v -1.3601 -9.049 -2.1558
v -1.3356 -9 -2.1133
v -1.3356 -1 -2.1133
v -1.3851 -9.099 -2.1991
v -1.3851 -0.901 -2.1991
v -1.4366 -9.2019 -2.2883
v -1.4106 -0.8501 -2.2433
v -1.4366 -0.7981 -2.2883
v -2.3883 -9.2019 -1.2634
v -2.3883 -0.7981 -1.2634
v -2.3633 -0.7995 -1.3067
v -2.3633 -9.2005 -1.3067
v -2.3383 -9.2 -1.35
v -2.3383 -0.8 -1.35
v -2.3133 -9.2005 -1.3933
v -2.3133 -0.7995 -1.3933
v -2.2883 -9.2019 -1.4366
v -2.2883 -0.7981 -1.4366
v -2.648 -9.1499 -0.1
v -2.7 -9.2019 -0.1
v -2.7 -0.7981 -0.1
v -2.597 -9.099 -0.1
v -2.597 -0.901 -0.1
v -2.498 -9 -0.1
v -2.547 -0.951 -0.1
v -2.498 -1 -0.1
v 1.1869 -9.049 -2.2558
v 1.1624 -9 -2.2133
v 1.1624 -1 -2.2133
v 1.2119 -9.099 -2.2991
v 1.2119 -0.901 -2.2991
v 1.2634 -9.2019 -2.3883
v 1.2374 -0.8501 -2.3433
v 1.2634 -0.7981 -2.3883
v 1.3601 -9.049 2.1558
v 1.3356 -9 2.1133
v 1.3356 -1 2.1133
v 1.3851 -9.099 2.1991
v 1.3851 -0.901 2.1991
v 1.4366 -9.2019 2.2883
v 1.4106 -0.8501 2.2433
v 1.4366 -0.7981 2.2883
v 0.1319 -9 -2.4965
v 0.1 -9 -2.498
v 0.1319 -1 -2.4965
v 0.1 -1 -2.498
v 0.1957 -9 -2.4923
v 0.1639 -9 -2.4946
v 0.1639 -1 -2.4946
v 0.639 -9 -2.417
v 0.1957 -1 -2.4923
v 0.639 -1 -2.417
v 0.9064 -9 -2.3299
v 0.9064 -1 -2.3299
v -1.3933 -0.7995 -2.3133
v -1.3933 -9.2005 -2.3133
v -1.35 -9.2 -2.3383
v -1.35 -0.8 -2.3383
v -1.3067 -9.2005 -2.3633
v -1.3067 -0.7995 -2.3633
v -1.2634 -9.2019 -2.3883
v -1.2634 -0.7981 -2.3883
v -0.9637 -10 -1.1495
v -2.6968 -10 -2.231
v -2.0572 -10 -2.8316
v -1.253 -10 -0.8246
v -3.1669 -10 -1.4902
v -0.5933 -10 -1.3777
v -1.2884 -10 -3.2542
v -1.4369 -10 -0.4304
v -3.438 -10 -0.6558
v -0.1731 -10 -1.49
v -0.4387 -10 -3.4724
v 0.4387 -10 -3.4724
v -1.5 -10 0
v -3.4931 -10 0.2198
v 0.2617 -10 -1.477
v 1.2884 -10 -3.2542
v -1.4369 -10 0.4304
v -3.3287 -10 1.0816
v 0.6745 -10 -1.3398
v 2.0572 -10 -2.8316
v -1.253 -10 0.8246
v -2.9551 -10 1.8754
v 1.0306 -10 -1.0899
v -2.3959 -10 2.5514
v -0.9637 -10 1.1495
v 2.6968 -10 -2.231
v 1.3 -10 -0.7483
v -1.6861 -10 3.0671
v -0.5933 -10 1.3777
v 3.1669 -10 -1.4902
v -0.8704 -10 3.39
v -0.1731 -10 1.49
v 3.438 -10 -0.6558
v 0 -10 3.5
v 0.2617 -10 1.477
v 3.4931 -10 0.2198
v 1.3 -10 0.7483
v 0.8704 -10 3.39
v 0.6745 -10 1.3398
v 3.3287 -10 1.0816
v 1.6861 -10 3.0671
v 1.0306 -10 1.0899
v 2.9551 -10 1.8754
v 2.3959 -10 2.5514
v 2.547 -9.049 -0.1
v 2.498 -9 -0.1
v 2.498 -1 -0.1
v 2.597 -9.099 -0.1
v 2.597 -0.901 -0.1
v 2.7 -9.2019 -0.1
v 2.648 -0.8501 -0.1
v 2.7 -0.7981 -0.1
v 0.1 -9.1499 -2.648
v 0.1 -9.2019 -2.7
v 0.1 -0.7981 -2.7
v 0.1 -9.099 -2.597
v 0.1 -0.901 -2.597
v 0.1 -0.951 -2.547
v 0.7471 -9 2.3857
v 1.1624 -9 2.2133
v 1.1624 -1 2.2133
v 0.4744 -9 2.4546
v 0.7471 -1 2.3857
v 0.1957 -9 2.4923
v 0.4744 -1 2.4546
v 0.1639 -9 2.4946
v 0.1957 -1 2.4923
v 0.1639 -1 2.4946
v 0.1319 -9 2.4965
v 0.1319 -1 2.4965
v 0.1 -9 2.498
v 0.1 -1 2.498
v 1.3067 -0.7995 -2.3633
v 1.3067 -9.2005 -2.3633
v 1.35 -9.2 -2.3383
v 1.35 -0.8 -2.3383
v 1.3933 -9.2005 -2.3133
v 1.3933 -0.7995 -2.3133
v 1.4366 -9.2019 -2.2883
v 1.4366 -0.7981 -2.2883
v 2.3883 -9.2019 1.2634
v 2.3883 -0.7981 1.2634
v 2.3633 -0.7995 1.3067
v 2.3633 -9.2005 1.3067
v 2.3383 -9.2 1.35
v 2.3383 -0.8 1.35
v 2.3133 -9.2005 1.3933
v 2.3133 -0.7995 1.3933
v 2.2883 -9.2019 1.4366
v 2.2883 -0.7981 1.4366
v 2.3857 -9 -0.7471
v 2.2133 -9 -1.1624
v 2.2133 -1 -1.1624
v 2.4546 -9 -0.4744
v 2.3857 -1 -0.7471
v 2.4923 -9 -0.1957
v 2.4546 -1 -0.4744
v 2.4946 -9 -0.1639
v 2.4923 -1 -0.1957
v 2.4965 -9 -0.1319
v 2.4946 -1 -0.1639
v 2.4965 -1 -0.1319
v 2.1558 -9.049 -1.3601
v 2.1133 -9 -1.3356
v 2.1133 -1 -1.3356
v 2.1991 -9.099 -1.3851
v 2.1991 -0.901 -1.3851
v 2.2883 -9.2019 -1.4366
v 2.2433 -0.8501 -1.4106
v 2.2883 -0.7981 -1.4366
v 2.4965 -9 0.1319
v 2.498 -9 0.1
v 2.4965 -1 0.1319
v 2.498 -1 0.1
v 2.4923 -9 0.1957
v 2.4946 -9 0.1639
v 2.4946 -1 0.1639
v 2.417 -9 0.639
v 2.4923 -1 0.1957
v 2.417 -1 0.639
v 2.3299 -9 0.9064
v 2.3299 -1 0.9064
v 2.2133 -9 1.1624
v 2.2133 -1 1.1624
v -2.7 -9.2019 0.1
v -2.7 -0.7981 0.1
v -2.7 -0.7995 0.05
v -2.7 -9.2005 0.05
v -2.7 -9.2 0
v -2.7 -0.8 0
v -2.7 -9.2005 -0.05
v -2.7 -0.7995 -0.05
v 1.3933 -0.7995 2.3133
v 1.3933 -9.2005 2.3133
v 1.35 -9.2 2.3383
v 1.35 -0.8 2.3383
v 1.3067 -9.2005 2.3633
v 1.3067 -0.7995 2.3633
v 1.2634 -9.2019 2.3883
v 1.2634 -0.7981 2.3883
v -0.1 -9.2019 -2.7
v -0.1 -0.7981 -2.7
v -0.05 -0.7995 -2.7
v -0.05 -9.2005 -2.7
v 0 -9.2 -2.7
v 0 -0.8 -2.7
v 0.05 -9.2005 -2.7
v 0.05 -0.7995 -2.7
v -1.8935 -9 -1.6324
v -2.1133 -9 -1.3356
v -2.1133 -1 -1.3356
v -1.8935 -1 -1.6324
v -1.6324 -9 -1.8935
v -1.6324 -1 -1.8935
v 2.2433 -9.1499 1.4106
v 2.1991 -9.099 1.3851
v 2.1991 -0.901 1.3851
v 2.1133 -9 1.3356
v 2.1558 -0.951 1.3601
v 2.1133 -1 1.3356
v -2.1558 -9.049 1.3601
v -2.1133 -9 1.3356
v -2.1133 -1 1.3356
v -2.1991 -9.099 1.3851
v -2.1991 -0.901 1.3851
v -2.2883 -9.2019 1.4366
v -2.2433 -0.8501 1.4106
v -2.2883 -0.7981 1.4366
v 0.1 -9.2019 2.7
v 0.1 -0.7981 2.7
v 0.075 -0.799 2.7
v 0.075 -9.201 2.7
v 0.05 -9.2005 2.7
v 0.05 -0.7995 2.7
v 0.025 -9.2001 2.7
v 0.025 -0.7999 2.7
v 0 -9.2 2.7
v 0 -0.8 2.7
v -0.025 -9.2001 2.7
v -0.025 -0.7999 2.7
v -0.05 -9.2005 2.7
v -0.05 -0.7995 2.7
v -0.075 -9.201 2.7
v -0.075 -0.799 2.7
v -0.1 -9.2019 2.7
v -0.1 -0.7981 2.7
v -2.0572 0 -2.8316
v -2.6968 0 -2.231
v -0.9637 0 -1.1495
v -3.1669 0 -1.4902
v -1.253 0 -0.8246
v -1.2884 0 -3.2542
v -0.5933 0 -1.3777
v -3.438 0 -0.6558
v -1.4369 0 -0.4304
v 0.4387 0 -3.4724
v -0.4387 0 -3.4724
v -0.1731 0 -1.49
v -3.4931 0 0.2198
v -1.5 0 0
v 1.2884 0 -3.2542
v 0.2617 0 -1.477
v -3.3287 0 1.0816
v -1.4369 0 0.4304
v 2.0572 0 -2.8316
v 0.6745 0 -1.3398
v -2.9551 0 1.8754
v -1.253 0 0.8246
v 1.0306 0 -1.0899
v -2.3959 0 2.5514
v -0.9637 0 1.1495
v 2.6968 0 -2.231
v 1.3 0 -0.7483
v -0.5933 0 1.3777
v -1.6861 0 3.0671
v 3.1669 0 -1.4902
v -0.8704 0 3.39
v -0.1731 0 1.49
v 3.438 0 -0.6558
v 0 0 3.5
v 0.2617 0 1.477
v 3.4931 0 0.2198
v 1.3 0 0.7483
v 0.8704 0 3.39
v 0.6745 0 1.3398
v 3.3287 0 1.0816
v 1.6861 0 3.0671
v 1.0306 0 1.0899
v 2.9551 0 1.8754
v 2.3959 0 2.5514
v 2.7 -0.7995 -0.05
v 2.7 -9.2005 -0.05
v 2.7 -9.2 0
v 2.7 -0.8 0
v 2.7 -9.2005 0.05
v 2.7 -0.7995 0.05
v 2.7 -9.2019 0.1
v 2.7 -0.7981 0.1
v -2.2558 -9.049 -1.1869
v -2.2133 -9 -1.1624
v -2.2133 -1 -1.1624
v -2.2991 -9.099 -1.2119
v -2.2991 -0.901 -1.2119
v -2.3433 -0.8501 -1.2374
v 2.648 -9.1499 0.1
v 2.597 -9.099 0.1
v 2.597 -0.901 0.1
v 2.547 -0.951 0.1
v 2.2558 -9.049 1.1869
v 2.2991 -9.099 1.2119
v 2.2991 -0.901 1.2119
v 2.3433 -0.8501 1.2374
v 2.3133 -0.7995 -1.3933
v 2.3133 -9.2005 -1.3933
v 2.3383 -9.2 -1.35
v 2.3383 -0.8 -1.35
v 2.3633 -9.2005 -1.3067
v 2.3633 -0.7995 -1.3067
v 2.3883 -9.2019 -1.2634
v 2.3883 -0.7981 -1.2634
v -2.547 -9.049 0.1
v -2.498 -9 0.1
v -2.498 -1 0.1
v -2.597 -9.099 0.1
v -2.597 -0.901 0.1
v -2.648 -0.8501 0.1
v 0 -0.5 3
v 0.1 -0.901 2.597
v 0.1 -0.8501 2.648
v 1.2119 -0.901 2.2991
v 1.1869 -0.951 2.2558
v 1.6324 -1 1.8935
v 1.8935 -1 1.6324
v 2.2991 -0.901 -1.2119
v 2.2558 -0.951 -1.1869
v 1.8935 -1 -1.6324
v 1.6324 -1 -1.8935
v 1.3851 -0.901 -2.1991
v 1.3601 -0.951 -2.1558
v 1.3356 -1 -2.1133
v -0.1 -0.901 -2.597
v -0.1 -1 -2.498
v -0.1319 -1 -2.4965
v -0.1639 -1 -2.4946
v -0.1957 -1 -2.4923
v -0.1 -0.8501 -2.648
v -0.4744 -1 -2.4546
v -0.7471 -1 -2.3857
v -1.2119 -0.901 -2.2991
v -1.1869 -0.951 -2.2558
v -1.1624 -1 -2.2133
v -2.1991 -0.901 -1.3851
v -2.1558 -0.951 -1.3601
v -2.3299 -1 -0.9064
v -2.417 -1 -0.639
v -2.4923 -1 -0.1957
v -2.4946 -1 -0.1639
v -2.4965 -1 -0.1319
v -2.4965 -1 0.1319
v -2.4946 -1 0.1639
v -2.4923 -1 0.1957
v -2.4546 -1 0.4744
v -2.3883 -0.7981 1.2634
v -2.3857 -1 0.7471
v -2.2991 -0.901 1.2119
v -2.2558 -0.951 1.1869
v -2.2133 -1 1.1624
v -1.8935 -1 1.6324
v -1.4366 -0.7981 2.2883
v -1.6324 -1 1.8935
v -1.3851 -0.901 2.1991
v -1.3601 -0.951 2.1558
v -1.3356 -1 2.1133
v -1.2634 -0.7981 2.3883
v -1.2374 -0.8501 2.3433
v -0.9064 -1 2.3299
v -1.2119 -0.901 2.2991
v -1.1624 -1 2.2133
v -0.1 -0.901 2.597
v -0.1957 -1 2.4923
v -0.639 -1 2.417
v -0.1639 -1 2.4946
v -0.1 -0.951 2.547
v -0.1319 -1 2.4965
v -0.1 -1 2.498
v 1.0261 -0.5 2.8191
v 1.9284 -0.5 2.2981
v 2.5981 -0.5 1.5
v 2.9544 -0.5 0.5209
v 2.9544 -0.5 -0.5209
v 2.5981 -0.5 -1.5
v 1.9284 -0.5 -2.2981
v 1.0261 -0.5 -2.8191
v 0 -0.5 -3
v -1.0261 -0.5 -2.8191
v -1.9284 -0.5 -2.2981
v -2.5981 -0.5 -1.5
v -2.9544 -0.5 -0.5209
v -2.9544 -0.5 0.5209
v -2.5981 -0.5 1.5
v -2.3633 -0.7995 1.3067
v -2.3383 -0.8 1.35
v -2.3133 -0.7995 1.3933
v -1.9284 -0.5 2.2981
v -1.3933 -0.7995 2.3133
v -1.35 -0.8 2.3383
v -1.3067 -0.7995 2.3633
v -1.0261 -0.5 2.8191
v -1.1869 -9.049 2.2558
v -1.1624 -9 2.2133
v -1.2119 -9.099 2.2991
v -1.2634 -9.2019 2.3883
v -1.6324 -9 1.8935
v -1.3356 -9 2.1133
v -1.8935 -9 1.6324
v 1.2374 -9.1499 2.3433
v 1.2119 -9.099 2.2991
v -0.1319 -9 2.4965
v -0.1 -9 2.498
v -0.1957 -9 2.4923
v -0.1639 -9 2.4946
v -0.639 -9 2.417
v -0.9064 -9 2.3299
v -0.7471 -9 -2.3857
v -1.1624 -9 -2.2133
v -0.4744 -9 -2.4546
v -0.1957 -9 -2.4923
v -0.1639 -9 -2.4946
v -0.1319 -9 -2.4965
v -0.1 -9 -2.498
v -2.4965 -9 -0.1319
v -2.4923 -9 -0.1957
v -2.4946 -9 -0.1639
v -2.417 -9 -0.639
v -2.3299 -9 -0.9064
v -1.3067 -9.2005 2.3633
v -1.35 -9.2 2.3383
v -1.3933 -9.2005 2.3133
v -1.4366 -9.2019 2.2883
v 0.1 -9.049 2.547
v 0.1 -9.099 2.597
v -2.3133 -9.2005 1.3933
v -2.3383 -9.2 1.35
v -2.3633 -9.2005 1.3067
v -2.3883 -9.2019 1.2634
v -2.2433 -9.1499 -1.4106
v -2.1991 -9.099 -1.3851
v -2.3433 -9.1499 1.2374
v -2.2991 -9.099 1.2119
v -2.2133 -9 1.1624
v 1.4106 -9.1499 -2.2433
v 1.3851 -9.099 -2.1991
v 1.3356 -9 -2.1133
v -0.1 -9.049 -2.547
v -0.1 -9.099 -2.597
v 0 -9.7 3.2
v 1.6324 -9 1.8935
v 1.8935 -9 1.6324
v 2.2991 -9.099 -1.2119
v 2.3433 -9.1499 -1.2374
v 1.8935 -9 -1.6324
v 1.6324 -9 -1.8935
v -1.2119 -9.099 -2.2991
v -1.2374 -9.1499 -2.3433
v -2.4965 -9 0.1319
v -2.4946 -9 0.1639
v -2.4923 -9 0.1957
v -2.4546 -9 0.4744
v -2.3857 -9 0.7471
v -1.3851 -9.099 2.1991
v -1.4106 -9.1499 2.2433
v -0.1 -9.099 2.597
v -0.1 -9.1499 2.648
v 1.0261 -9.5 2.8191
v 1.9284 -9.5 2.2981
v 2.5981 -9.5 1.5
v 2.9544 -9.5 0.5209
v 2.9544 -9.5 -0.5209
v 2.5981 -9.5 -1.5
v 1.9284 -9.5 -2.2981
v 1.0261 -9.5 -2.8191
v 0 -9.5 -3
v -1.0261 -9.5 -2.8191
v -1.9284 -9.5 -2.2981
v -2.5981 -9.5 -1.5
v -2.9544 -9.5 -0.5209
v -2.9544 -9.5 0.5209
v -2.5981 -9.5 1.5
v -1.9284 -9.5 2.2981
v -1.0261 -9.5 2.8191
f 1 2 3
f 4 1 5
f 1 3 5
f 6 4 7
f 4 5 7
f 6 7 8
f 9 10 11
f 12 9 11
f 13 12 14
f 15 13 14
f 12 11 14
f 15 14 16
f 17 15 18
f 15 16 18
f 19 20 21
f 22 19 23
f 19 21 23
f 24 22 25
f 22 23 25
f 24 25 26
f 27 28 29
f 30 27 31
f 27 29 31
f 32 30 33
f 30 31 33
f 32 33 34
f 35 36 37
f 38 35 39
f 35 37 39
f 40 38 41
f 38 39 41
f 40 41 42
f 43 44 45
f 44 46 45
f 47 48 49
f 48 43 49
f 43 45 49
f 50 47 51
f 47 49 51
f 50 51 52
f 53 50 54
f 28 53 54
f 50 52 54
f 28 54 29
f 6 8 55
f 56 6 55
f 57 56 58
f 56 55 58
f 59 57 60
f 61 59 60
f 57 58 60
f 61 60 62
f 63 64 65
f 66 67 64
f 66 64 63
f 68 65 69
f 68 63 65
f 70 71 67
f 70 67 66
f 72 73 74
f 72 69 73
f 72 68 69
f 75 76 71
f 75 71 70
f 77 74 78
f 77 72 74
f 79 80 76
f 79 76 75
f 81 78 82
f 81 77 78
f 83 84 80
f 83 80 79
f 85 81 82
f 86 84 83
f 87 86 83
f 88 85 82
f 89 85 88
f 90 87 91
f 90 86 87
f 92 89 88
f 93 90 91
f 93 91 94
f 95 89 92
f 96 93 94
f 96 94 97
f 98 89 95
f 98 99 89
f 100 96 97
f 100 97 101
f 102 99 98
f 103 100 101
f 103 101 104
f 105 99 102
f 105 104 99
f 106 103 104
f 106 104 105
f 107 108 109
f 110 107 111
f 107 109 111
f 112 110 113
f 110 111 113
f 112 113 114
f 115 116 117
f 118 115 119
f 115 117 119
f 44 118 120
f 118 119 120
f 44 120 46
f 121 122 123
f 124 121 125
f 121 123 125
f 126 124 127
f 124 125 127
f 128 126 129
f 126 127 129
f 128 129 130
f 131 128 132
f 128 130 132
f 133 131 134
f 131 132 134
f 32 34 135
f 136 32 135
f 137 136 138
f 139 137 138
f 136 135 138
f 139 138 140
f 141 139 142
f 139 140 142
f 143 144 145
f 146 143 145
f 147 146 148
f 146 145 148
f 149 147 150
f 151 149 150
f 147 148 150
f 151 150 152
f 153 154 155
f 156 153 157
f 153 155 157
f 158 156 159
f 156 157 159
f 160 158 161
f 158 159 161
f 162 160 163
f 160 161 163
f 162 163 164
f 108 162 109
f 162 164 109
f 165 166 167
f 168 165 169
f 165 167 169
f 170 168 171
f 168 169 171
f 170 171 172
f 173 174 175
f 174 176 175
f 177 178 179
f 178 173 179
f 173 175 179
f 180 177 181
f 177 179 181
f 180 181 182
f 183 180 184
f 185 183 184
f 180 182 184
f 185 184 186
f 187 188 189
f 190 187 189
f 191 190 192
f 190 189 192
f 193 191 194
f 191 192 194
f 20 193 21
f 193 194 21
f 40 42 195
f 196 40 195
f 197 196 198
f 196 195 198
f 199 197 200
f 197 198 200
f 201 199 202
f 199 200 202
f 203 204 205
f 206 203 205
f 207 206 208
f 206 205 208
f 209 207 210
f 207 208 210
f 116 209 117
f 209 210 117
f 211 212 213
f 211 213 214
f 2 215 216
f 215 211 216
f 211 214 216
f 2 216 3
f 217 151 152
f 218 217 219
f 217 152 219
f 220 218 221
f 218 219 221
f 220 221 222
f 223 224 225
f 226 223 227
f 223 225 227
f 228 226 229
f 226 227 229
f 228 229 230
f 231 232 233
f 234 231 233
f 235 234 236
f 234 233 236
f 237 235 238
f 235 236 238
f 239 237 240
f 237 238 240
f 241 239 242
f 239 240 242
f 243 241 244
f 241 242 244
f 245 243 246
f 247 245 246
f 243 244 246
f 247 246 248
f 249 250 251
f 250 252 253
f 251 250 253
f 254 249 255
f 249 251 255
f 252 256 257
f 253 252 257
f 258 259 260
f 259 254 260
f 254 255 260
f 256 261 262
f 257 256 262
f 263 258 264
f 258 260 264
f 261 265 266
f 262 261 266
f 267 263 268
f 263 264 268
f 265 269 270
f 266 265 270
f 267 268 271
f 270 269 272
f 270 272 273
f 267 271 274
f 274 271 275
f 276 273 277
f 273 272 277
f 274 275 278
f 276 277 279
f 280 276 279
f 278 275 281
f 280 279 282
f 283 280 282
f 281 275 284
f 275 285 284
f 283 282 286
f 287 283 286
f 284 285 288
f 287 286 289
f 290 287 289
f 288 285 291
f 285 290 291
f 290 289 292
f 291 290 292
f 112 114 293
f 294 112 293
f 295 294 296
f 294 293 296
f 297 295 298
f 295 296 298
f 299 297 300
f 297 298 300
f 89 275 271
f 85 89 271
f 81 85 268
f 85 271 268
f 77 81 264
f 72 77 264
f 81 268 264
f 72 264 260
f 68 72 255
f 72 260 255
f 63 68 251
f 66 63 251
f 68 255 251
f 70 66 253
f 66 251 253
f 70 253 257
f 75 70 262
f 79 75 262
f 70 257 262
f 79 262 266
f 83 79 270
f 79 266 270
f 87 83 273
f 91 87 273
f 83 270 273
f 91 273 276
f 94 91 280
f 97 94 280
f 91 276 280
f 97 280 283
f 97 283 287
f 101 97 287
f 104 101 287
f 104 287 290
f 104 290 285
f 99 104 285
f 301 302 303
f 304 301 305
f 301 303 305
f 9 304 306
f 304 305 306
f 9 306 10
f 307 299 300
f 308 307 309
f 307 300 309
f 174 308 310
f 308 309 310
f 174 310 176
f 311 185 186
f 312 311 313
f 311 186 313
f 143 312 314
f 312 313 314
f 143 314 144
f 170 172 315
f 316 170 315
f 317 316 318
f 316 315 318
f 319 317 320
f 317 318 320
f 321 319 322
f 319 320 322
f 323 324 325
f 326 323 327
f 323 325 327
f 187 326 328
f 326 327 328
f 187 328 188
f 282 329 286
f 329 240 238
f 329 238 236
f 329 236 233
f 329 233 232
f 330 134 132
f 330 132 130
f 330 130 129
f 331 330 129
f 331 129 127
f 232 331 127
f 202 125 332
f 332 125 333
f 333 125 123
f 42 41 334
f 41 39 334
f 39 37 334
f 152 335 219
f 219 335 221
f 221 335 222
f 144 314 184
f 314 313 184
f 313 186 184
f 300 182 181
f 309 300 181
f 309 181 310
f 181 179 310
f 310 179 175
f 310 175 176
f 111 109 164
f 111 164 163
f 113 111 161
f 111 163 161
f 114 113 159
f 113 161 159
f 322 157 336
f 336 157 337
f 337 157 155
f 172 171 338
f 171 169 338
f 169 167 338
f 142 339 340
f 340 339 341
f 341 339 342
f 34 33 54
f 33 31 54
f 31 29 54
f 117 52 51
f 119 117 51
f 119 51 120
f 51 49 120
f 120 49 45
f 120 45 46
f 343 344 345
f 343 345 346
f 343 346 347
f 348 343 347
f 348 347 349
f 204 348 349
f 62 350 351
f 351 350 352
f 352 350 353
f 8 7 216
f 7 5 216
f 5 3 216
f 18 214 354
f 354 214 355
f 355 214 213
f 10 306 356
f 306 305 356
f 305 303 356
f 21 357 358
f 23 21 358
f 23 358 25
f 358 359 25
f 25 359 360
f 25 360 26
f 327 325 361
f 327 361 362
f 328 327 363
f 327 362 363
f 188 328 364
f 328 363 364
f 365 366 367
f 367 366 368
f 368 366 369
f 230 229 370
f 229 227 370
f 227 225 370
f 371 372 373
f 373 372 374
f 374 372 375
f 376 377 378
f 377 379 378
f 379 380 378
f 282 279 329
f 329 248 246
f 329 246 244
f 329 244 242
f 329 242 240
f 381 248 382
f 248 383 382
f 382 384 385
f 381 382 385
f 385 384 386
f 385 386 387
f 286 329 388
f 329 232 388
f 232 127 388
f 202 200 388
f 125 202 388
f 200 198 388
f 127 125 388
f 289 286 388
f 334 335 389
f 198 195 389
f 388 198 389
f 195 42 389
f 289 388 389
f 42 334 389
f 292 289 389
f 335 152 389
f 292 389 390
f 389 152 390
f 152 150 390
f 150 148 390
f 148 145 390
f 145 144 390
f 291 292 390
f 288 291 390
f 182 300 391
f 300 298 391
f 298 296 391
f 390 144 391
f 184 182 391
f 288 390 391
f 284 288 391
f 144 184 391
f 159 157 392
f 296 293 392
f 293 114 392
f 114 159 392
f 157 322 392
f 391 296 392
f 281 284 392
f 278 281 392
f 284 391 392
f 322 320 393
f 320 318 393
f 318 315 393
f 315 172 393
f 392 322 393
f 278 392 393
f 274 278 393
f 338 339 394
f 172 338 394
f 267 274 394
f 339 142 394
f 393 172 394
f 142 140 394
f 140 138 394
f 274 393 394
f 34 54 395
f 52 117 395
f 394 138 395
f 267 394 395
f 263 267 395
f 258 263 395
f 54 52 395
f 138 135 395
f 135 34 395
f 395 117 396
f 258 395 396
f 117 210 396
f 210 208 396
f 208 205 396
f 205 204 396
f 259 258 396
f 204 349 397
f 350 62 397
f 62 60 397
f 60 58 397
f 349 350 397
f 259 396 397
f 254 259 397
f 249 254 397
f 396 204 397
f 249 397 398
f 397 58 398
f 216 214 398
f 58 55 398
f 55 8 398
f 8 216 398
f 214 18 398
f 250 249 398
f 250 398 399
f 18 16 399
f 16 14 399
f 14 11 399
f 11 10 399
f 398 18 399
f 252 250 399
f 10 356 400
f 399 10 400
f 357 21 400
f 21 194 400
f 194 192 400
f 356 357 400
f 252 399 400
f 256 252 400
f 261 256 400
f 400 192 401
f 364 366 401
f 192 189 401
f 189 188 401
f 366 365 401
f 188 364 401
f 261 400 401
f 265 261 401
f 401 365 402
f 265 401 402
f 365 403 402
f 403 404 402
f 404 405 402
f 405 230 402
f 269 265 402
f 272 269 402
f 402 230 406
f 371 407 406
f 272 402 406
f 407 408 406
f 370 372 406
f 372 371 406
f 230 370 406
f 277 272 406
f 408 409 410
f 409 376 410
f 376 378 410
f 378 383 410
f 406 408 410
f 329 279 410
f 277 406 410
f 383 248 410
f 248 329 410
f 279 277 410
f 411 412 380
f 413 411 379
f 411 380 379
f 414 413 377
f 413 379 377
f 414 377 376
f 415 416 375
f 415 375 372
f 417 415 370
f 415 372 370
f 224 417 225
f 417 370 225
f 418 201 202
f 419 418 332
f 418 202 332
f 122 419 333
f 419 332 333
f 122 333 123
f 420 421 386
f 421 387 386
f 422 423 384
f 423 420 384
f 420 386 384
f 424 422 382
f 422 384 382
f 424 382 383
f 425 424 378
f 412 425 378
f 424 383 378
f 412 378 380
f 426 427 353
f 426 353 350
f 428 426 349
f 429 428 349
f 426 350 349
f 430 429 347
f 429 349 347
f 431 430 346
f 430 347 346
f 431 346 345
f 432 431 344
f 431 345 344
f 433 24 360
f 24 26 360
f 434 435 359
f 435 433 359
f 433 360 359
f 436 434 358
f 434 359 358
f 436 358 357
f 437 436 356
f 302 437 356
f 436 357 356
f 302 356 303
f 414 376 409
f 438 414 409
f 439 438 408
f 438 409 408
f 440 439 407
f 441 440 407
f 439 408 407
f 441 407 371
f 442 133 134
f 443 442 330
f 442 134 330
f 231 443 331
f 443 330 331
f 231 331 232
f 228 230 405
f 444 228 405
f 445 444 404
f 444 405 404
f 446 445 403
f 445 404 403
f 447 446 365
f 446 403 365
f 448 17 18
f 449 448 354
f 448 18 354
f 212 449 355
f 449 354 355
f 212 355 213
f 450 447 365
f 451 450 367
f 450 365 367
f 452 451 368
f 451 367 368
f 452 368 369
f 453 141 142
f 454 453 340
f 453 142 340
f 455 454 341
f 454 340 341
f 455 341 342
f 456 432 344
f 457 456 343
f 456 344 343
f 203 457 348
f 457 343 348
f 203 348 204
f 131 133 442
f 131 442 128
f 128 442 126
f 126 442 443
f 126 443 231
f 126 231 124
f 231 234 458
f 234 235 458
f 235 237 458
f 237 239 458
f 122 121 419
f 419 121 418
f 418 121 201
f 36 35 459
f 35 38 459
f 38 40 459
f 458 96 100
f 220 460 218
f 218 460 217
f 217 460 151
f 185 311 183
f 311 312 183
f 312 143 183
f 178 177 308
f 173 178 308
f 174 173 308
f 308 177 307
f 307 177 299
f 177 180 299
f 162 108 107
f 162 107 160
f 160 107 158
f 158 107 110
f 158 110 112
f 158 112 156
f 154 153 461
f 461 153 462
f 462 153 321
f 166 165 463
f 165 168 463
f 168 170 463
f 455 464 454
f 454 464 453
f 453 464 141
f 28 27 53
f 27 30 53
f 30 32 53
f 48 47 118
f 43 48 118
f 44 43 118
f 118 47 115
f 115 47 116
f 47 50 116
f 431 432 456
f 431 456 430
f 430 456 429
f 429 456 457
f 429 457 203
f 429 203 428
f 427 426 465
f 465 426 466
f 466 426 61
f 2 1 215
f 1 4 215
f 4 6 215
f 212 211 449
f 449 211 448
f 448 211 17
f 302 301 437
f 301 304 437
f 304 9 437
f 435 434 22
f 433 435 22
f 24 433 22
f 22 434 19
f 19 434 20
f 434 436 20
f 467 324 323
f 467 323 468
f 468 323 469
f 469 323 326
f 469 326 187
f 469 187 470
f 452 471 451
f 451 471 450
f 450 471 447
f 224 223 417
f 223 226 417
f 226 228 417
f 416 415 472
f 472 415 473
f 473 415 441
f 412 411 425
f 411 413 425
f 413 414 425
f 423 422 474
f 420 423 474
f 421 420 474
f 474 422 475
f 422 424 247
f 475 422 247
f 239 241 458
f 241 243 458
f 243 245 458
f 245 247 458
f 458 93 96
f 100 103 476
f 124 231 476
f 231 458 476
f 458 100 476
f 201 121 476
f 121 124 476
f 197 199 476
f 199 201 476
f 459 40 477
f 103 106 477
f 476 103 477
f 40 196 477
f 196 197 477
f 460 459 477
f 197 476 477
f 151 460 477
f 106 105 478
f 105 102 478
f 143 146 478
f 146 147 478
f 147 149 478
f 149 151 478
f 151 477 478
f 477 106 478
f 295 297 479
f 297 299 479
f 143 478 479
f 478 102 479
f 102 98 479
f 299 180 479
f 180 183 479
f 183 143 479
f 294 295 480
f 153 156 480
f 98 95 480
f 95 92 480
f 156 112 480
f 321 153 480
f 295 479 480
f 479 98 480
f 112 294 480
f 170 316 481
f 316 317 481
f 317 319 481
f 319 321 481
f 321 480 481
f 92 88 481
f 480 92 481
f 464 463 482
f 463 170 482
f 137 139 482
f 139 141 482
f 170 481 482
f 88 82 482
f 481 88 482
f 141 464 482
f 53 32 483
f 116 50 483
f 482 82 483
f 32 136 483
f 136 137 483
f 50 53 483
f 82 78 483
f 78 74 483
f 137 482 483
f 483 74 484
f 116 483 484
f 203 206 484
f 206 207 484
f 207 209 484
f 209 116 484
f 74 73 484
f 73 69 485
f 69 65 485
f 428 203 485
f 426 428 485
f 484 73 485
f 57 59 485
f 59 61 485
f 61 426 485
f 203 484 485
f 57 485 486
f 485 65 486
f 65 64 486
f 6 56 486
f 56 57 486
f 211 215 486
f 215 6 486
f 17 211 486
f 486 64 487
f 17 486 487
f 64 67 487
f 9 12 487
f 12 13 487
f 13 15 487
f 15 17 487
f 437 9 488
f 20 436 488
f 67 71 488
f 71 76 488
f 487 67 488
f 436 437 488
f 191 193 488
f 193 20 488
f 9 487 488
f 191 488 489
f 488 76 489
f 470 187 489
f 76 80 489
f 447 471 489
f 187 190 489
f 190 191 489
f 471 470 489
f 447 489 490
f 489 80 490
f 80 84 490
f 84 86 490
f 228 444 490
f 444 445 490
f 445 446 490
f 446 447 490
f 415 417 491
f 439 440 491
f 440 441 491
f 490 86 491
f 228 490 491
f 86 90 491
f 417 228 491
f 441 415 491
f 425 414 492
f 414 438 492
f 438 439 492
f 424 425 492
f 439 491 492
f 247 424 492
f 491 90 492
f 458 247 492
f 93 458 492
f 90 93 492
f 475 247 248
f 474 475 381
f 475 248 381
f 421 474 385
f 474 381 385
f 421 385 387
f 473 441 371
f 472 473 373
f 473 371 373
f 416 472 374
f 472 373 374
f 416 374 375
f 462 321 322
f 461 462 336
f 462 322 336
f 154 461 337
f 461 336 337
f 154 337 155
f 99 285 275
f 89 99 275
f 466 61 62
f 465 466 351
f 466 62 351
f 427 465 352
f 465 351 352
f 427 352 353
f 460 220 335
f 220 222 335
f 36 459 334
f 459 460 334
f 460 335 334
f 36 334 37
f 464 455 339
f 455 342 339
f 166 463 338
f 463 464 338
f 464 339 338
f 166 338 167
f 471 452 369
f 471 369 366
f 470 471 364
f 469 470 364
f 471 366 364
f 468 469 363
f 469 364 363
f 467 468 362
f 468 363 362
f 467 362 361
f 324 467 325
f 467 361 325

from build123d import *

# Parameters (mm, degrees)
F1_DEPTH = 10


with BuildPart() as f1:
    # F0 (on Front) → F1 (new body)
    with BuildSketch(Plane.XZ):
        with BuildLine():
            ThreePointArc((-0.1, 2.497999), (0, 2.5), (0.1, 2.497999))
            Line((0.1, 2.497999), (0.1, 2.7))
            Line((0.1, 2.7), (-0.1, 2.7))
            Line((-0.1, 2.7), (-0.1, 2.497999))
        make_face()
        with BuildLine():
            ThreePointArc((-1.335602, 2.113331), (-1.25, 2.165064), (-1.162397, 2.213331))
            Line((-1.162397, 2.213331), (-1.263397, 2.388269))
            Line((-1.263397, 2.388269), (-1.436603, 2.288269))
            Line((-1.436603, 2.288269), (-1.335602, 2.113331))
        make_face()
        with BuildLine():
            ThreePointArc((-2.213331, 1.162397), (-2.165064, 1.25), (-2.113331, 1.335602))
            Line((-2.113331, 1.335602), (-2.288269, 1.436603))
            Line((-2.288269, 1.436603), (-2.388269, 1.263397))
            Line((-2.388269, 1.263397), (-2.213331, 1.162397))
        make_face()
        with BuildLine():
            ThreePointArc((-2.497999, -0.1), (-2.5, 0), (-2.497999, 0.1))
            Line((-2.497999, 0.1), (-2.7, 0.1))
            Line((-2.7, 0.1), (-2.7, -0.1))
            Line((-2.7, -0.1), (-2.497999, -0.1))
        make_face()
        with BuildLine():
            Line((-2.288269, -1.436603), (-2.113331, -1.335602))
            ThreePointArc((-2.113331, -1.335602), (-2.165064, -1.25), (-2.213331, -1.162397))
            Line((-2.213331, -1.162397), (-2.388269, -1.263397))
            Line((-2.388269, -1.263397), (-2.288269, -1.436603))
        make_face()
        with BuildLine():
            Line((-1.263397, -2.388269), (-1.162397, -2.213331))
            ThreePointArc((-1.162397, -2.213331), (-1.25, -2.165064), (-1.335602, -2.113331))
            Line((-1.335602, -2.113331), (-1.436603, -2.288269))
            Line((-1.436603, -2.288269), (-1.263397, -2.388269))
        make_face()
        with BuildLine():
            Line((0.1, -2.7), (0.1, -2.497999))
            ThreePointArc((0.1, -2.497999), (0, -2.5), (-0.1, -2.497999))
            Line((-0.1, -2.497999), (-0.1, -2.7))
            Line((-0.1, -2.7), (0.1, -2.7))
        make_face()
        with BuildLine():
            Line((1.436603, -2.288269), (1.335602, -2.113331))
            ThreePointArc((1.335602, -2.113331), (1.25, -2.165064), (1.162397, -2.213331))
            Line((1.162397, -2.213331), (1.263397, -2.388269))
            Line((1.263397, -2.388269), (1.436603, -2.288269))
        make_face()
        with BuildLine():
            Line((2.388269, -1.263397), (2.213331, -1.162397))
            ThreePointArc((2.213331, -1.162397), (2.165064, -1.25), (2.113331, -1.335602))
            Line((2.113331, -1.335602), (2.288269, -1.436603))
            Line((2.288269, -1.436603), (2.388269, -1.263397))
        make_face()
        with BuildLine():
            ThreePointArc((2.497999, 0.1), (2.4995, 0.05001), (2.5, 0))
            ThreePointArc((2.5, 0), (2.4995, -0.05001), (2.497999, -0.1))
            Line((2.497999, -0.1), (2.7, -0.1))
            Line((2.7, -0.1), (2.7, 0.1))
            Line((2.7, 0.1), (2.497999, 0.1))
        make_face()
        with BuildLine():
            ThreePointArc((2.113331, 1.335602), (2.165064, 1.25), (2.213331, 1.162397))
            Line((2.213331, 1.162397), (2.388269, 1.263397))
            Line((2.388269, 1.263397), (2.288269, 1.436603))
            Line((2.288269, 1.436603), (2.113331, 1.335602))
        make_face()
        with BuildLine():
            ThreePointArc((1.162397, 2.213331), (1.25, 2.165064), (1.335602, 2.113331))
            Line((1.335602, 2.113331), (1.436603, 2.288269))
            Line((1.436603, 2.288269), (1.263397, 2.388269))
            Line((1.263397, 2.388269), (1.162397, 2.213331))
        make_face()
        with BuildLine():
            ThreePointArc((2.497999, -0.1), (2.4995, -0.05001), (2.5, 0))
            ThreePointArc((2.5, 0), (2.4995, 0.05001), (2.497999, 0.1))
            ThreePointArc((2.497999, 0.1), (2.414815, 0.647048), (2.213331, 1.162397))
            ThreePointArc((2.213331, 1.162397), (2.165064, 1.25), (2.113331, 1.335602))
            ThreePointArc((2.113331, 1.335602), (1.767767, 1.767767), (1.335602, 2.113331))
            ThreePointArc((1.335602, 2.113331), (1.25, 2.165064), (1.162397, 2.213331))
            ThreePointArc((1.162397, 2.213331), (0.647048, 2.414815), (0.1, 2.497999))
            ThreePointArc((0.1, 2.497999), (0, 2.5), (-0.1, 2.497999))
            ThreePointArc((-0.1, 2.497999), (-0.647048, 2.414815), (-1.162397, 2.213331))
            ThreePointArc((-1.162397, 2.213331), (-1.25, 2.165064), (-1.335602, 2.113331))
            ThreePointArc((-1.335602, 2.113331), (-1.767767, 1.767767), (-2.113331, 1.335602))
            ThreePointArc((-2.113331, 1.335602), (-2.165064, 1.25), (-2.213331, 1.162397))
            ThreePointArc((-2.213331, 1.162397), (-2.414815, 0.647048), (-2.497999, 0.1))
            ThreePointArc((-2.497999, 0.1), (-2.5, 0), (-2.497999, -0.1))
            ThreePointArc((-2.497999, -0.1), (-2.414815, -0.647048), (-2.213331, -1.162397))
            ThreePointArc((-2.213331, -1.162397), (-2.165064, -1.25), (-2.113331, -1.335602))
            ThreePointArc((-2.113331, -1.335602), (-1.767767, -1.767767), (-1.335602, -2.113331))
            ThreePointArc((-1.335602, -2.113331), (-1.25, -2.165064), (-1.162397, -2.213331))
            ThreePointArc((-1.162397, -2.213331), (-0.647048, -2.414815), (-0.1, -2.497999))
            ThreePointArc((-0.1, -2.497999), (0, -2.5), (0.1, -2.497999))
            ThreePointArc((0.1, -2.497999), (0.647048, -2.414815), (1.162397, -2.213331))
            ThreePointArc((1.162397, -2.213331), (1.25, -2.165064), (1.335602, -2.113331))
            ThreePointArc((1.335602, -2.113331), (1.767767, -1.767767), (2.113331, -1.335602))
            ThreePointArc((2.113331, -1.335602), (2.165064, -1.25), (2.213331, -1.162397))
            ThreePointArc((2.213331, -1.162397), (2.414815, -0.647048), (2.497999, -0.1))
        make_face()
        with BuildLine():
            ThreePointArc((1.3, -0.748331), (-1.5, 0), (1.3, 0.748331))
            Line((1.3, 0.748331), (1.3, -0.748331))
        make_face(mode=Mode.SUBTRACT)
    extrude(amount=F1_DEPTH)

    # F2 (on Right) → F3 (revolve)
    with BuildSketch(Plane.YZ):
        Polygon((-9, 2.5), (-10, 3.5), (-10, 2.5), align=None)
        Polygon((-1, 2.5), (0, 2.5), (0, 3.5), align=None)
    revolve(axis=Axis((0, -5.253473, 0), (0, 1, 0)))


solid = f1.part
